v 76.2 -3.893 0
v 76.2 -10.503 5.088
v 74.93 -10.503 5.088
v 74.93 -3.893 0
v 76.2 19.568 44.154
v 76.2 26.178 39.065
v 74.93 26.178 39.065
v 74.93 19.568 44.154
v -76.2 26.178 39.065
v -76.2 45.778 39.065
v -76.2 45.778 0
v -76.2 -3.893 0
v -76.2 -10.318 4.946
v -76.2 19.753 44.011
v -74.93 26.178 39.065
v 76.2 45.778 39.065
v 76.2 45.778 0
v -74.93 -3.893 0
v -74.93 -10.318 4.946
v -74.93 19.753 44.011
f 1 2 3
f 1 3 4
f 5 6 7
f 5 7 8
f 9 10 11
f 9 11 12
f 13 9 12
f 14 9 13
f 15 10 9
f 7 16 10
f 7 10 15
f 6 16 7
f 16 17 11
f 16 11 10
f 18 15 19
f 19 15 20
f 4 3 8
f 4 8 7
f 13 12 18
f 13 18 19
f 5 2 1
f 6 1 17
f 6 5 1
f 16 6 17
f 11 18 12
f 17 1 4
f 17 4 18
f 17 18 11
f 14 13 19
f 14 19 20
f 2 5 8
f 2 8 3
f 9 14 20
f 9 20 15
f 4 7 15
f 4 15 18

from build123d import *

# Parameters (mm, degrees)
F1_DEPTH = 76.2
F3_DEPTH = 1.27
F5_DEPTH = 1.27


with BuildPart() as f1:
    # F0 (on Right) → F1 (new body, symmetric)
    with BuildSketch(Plane.YZ):
        Polygon((26.177771, 39.065287), (-3.893106, 0), (26.177771, 0), (45.777533, 0), (45.777533, 39.065287), align=None)
    extrude(amount=F1_DEPTH, both=True)

    # F2 (on face) → F3 (join)
    with BuildSketch(Plane.YZ.offset(76.2)):
        Polygon((-10.503355, 5.088302), (-3.893106, 0), (26.177771, 39.065287), (19.567522, 44.153589), align=None)
    extrude(amount=-F3_DEPTH)

    # F4 (on face) → F5 (join)
    with BuildSketch(Plane(origin=(-76.2, 0, 0), x_dir=(0, -1, 0), z_dir=(-1, 0, 0))):
        Polygon((-19.752756, 44.011004), (-26.177771, 39.065287), (3.893106, 0), (10.318121, 4.945717), align=None)
    extrude(amount=-F5_DEPTH)


solid = f1.part
